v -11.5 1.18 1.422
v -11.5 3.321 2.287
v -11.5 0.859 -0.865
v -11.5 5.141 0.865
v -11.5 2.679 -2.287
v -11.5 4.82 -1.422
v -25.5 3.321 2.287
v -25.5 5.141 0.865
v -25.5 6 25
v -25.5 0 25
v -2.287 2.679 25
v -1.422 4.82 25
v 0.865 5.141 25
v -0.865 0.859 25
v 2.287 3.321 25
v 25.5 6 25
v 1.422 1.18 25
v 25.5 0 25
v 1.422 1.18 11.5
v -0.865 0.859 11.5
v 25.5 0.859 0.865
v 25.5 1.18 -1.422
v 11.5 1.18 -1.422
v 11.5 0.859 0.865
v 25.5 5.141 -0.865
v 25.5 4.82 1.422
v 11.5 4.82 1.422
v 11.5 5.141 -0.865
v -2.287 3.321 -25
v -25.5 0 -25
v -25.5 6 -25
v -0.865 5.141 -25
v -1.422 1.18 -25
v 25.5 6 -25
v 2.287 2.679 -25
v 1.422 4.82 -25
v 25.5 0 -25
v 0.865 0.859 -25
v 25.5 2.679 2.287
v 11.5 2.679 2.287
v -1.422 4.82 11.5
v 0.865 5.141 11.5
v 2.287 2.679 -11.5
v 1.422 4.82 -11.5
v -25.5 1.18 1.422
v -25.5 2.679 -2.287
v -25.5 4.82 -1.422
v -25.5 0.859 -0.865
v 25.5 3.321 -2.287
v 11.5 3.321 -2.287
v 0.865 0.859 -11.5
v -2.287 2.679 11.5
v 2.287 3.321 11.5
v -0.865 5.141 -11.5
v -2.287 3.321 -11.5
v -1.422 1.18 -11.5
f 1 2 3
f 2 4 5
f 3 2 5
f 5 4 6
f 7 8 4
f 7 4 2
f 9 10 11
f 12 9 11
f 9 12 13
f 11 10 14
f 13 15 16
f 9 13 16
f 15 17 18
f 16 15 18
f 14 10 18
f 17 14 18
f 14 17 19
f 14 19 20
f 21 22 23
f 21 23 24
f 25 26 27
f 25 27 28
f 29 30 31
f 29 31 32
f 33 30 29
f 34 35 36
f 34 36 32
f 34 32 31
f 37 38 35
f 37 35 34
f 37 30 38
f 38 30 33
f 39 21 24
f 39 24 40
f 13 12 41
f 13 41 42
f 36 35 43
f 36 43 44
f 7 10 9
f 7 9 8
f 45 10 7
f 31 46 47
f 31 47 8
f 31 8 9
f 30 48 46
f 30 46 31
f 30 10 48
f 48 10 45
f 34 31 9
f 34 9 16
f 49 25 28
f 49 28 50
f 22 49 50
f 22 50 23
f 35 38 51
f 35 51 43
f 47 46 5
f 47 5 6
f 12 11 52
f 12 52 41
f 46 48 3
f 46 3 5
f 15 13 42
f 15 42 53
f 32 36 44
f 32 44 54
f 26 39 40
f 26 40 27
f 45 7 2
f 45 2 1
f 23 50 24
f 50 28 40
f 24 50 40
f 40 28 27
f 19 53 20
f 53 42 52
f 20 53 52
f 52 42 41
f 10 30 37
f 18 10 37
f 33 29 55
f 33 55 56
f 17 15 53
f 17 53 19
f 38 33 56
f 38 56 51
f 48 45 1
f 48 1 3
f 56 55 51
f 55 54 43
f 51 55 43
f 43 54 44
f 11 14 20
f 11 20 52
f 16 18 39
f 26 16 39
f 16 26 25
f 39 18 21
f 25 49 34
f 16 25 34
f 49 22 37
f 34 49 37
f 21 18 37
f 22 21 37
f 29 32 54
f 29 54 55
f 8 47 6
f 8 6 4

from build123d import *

# Parameters (mm, degrees)
ESBO_O2_W                = 51
ESBO_O2_H                = 50
RESSALTO_EXTRUS_O2_DEPTH = 6
CORTE_EXTRUS_O1_START    = -1
CORTE_EXTRUS_O1_DEPTH    = 15
PADR_OCIRCULAR1_COUNT    = 4


with BuildPart() as part:
    # Esboço2 → Ressalto-extrusão2 (new body)
    with BuildSketch(Plane(origin=(0, 0, 0), x_dir=(1, 0, 0), z_dir=(0, 1, 0))):
        Rectangle(ESBO_O2_W, ESBO_O2_H)
    extrude(amount=RESSALTO_EXTRUS_O2_DEPTH)

    # Esboço3 → Corte-extrusão1 (cut)
    with BuildSketch(Plane.ZY.offset(-25.5).offset(CORTE_EXTRUS_O1_START)):
        Polygon((-1.421809274, 1.180167117), (0.86511687, 0.858760608), (2.286926144, 2.678593491), (1.421809274, 4.819832883), (-0.86511687, 5.141239392), (-2.286926144, 3.321406509), align=None)
    corte_extrus_o1 = extrude(amount=CORTE_EXTRUS_O1_DEPTH, mode=Mode.SUBTRACT)

    # PadrãoCircular1: Corte-extrusão1 ×4 about axis
    padr_ocircular1_axis = Axis((0, 0, 0), (0, 1, 0))
    for i in range(1, PADR_OCIRCULAR1_COUNT):
        add(corte_extrus_o1.rotate(padr_ocircular1_axis, i * 360 / PADR_OCIRCULAR1_COUNT), mode=Mode.SUBTRACT)


solid = part.part
